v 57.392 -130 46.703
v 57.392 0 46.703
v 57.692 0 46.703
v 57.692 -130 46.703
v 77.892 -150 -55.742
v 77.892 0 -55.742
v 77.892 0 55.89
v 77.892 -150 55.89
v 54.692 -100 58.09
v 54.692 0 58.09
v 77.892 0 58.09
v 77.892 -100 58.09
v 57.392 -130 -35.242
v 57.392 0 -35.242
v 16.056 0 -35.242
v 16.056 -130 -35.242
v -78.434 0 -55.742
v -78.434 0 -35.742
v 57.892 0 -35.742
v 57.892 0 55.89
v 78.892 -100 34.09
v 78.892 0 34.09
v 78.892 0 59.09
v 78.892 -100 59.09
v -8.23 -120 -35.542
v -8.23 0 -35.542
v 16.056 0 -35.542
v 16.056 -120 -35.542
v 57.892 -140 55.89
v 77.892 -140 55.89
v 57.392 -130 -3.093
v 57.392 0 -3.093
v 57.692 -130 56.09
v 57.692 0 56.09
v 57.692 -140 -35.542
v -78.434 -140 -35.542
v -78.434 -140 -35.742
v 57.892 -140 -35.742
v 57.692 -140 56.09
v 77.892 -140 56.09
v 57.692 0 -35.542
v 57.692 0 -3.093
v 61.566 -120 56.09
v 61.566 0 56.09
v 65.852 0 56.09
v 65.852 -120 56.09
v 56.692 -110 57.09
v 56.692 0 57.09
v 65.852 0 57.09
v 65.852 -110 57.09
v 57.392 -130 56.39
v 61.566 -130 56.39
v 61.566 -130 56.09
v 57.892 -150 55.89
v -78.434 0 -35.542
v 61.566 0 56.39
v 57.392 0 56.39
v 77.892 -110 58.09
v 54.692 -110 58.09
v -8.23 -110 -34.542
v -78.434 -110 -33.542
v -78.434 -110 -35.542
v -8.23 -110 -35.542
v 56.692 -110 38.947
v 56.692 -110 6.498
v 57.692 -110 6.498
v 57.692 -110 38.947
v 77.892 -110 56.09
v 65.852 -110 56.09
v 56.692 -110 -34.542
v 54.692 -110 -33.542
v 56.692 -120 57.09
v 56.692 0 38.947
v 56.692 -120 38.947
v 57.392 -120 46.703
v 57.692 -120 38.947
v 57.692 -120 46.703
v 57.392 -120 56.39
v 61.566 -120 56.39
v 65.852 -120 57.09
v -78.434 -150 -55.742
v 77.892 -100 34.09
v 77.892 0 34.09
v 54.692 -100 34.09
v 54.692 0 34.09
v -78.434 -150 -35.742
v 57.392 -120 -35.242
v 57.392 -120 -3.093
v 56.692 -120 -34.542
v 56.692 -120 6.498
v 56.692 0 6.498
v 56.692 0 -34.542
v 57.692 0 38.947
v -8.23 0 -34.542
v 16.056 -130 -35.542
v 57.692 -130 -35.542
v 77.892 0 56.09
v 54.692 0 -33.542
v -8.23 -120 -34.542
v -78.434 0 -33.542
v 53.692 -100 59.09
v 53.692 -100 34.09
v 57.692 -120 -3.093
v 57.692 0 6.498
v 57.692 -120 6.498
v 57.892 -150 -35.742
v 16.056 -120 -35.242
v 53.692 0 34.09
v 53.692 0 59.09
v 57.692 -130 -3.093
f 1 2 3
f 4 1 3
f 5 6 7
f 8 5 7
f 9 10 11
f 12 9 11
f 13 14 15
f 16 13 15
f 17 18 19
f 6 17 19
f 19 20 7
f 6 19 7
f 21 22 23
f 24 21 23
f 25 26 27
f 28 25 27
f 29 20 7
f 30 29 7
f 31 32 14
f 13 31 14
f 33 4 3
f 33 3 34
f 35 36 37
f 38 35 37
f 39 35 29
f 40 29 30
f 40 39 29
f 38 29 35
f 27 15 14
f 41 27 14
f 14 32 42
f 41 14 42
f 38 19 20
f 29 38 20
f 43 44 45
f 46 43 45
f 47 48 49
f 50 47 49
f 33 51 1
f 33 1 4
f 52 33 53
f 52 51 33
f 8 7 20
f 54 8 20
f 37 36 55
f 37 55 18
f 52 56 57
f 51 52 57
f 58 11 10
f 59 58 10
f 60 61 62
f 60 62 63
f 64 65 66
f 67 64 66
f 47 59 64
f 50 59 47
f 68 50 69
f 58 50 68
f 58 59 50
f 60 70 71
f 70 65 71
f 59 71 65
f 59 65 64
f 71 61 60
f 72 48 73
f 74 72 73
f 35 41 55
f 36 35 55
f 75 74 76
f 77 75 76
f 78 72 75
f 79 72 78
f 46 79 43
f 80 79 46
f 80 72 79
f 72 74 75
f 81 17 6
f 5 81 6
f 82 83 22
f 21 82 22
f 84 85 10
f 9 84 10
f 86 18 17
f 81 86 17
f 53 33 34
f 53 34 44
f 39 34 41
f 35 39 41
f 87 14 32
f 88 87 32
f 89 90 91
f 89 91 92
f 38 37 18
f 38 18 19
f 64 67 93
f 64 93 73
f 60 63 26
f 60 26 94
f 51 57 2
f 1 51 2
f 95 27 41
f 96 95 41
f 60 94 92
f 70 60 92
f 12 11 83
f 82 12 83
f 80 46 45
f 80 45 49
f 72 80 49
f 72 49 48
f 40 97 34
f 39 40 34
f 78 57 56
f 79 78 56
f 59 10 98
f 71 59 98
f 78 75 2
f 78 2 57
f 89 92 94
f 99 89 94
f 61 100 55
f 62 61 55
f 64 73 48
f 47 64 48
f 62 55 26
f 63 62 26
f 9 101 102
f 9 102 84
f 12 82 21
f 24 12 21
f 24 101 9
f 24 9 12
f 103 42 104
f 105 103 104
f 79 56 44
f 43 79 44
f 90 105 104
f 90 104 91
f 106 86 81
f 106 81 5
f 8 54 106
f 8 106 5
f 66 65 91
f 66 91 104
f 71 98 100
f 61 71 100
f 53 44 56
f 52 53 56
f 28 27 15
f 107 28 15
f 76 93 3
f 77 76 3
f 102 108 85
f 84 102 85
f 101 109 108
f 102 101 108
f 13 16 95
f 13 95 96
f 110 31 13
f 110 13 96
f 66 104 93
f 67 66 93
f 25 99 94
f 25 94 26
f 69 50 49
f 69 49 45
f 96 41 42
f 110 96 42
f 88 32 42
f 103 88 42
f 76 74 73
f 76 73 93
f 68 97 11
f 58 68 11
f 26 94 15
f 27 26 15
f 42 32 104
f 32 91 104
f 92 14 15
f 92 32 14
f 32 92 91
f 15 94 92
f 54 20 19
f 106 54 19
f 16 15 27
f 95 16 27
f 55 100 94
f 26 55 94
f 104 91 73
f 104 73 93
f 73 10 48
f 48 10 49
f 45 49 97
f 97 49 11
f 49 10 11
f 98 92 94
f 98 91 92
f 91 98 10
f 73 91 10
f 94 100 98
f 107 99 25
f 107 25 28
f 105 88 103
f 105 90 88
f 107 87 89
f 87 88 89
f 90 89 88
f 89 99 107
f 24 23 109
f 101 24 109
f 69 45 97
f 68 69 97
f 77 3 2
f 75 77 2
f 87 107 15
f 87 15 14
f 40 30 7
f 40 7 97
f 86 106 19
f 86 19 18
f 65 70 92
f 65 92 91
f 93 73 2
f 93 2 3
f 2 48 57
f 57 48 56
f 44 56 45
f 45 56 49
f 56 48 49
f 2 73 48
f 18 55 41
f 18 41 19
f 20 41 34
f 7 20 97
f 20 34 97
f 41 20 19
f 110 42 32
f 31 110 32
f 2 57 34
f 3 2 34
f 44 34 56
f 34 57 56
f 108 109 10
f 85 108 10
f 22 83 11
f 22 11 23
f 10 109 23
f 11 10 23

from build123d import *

# Parameters (mm, degrees)
F1_DEPTH = 150
F2_DEPTH = 140
F3_DEPTH = 130
F4_DEPTH = 130
F5_DEPTH = 120
F6_DEPTH = 120
F7_DEPTH = 110
F8_DEPTH = 100


with BuildPart() as f1:
    # F0 (on Front) → F1 (new body)
    with BuildSketch(Plane.XZ):
        Polygon((57.892417, -35.742365), (-78.434123, -35.742365), (-78.434123, -55.742365), (77.892417, -55.742365), (77.892417, 34.090297), (77.892417, 55.890297), (57.892417, 55.890297), align=None)
    extrude(amount=F1_DEPTH)


with BuildPart() as f2:
    # F0 (on Front) → F2 (new body)
    with BuildSketch(Plane.XZ):
        Polygon((-78.434123, -35.542365), (-78.434123, -35.742365), (57.892417, -35.742365), (57.892417, 55.890297), (77.892417, 55.890297), (77.892417, 56.090297), (65.851599, 56.090297), (61.565888, 56.090297), (57.692417, 56.090297), (57.692417, 46.702539), (57.692417, 38.947439), (57.692417, 6.498455), (57.692417, -3.093383), (57.692417, -35.542365), (16.055677, -35.542365), (-8.230039, -35.542365), align=None)
    extrude(amount=F2_DEPTH)


with BuildPart() as f3:
    # F0 (on Front) → F3 (new body)
    with BuildSketch(Plane.XZ):
        Polygon((16.055677, -35.242365), (16.055677, -35.542365), (57.692417, -35.542365), (57.692417, -3.093383), (57.392417, -3.093383), (57.392417, -35.242365), align=None)
    extrude(amount=F3_DEPTH)


with BuildPart() as f4:
    # F0 (on Front) → F4 (new body)
    with BuildSketch(Plane.XZ):
        Polygon((57.692417, 56.090297), (61.565888, 56.090297), (61.565888, 56.390297), (57.392417, 56.390297), (57.392417, 46.702539), (57.692417, 46.702539), align=None)
    extrude(amount=F4_DEPTH)


with BuildPart() as f5:
    # F0 (on Front) → F5 (new body)
    with BuildSketch(Plane.XZ):
        Polygon((61.565888, 56.090297), (65.851599, 56.090297), (65.851599, 57.090297), (56.692417, 57.090297), (56.692417, 38.947439), (57.692417, 38.947439), (57.692417, 46.702539), (57.392417, 46.702539), (57.392417, 56.390297), (61.565888, 56.390297), align=None)
    extrude(amount=F5_DEPTH)


with BuildPart() as f6:
    # F0 (on Front) → F6 (new body)
    with BuildSketch(Plane.XZ):
        Polygon((-8.230039, -34.542365), (-8.230039, -35.542365), (16.055677, -35.542365), (16.055677, -35.242365), (57.392417, -35.242365), (57.392417, -3.093383), (57.692417, -3.093383), (57.692417, 6.498455), (56.692417, 6.498455), (56.692417, -34.542365), align=None)
    extrude(amount=F6_DEPTH)


with BuildPart() as f7:
    # F0 (on Front) → F7 (new body)
    with BuildSketch(Plane.XZ):
        Polygon((-78.434123, -33.542365), (-78.434123, -35.542365), (-8.230039, -35.542365), (-8.230039, -34.542365), (56.692417, -34.542365), (56.692417, 6.498455), (57.692417, 6.498455), (57.692417, 38.947439), (56.692417, 38.947439), (56.692417, 57.090297), (65.851599, 57.090297), (65.851599, 56.090297), (77.892417, 56.090297), (77.892417, 58.090297), (54.692417, 58.090297), (54.692417, 34.090297), (54.692417, -33.542365), align=None)
    extrude(amount=F7_DEPTH)


with BuildPart() as f8:
    # F0 (on Front) → F8 (new body)
    with BuildSketch(Plane.XZ):
        Polygon((77.892417, 55.890297), (77.892417, 34.090297), (78.892417, 34.090297), (78.892417, 59.090297), (53.692417, 59.090297), (53.692417, 34.090297), (54.692417, 34.090297), (54.692417, 58.090297), (77.892417, 58.090297), (77.892417, 56.090297), align=None)
    extrude(amount=F8_DEPTH)


solid = Compound([f1.part, f2.part, f3.part, f4.part, f5.part, f6.part, f7.part, f8.part])
